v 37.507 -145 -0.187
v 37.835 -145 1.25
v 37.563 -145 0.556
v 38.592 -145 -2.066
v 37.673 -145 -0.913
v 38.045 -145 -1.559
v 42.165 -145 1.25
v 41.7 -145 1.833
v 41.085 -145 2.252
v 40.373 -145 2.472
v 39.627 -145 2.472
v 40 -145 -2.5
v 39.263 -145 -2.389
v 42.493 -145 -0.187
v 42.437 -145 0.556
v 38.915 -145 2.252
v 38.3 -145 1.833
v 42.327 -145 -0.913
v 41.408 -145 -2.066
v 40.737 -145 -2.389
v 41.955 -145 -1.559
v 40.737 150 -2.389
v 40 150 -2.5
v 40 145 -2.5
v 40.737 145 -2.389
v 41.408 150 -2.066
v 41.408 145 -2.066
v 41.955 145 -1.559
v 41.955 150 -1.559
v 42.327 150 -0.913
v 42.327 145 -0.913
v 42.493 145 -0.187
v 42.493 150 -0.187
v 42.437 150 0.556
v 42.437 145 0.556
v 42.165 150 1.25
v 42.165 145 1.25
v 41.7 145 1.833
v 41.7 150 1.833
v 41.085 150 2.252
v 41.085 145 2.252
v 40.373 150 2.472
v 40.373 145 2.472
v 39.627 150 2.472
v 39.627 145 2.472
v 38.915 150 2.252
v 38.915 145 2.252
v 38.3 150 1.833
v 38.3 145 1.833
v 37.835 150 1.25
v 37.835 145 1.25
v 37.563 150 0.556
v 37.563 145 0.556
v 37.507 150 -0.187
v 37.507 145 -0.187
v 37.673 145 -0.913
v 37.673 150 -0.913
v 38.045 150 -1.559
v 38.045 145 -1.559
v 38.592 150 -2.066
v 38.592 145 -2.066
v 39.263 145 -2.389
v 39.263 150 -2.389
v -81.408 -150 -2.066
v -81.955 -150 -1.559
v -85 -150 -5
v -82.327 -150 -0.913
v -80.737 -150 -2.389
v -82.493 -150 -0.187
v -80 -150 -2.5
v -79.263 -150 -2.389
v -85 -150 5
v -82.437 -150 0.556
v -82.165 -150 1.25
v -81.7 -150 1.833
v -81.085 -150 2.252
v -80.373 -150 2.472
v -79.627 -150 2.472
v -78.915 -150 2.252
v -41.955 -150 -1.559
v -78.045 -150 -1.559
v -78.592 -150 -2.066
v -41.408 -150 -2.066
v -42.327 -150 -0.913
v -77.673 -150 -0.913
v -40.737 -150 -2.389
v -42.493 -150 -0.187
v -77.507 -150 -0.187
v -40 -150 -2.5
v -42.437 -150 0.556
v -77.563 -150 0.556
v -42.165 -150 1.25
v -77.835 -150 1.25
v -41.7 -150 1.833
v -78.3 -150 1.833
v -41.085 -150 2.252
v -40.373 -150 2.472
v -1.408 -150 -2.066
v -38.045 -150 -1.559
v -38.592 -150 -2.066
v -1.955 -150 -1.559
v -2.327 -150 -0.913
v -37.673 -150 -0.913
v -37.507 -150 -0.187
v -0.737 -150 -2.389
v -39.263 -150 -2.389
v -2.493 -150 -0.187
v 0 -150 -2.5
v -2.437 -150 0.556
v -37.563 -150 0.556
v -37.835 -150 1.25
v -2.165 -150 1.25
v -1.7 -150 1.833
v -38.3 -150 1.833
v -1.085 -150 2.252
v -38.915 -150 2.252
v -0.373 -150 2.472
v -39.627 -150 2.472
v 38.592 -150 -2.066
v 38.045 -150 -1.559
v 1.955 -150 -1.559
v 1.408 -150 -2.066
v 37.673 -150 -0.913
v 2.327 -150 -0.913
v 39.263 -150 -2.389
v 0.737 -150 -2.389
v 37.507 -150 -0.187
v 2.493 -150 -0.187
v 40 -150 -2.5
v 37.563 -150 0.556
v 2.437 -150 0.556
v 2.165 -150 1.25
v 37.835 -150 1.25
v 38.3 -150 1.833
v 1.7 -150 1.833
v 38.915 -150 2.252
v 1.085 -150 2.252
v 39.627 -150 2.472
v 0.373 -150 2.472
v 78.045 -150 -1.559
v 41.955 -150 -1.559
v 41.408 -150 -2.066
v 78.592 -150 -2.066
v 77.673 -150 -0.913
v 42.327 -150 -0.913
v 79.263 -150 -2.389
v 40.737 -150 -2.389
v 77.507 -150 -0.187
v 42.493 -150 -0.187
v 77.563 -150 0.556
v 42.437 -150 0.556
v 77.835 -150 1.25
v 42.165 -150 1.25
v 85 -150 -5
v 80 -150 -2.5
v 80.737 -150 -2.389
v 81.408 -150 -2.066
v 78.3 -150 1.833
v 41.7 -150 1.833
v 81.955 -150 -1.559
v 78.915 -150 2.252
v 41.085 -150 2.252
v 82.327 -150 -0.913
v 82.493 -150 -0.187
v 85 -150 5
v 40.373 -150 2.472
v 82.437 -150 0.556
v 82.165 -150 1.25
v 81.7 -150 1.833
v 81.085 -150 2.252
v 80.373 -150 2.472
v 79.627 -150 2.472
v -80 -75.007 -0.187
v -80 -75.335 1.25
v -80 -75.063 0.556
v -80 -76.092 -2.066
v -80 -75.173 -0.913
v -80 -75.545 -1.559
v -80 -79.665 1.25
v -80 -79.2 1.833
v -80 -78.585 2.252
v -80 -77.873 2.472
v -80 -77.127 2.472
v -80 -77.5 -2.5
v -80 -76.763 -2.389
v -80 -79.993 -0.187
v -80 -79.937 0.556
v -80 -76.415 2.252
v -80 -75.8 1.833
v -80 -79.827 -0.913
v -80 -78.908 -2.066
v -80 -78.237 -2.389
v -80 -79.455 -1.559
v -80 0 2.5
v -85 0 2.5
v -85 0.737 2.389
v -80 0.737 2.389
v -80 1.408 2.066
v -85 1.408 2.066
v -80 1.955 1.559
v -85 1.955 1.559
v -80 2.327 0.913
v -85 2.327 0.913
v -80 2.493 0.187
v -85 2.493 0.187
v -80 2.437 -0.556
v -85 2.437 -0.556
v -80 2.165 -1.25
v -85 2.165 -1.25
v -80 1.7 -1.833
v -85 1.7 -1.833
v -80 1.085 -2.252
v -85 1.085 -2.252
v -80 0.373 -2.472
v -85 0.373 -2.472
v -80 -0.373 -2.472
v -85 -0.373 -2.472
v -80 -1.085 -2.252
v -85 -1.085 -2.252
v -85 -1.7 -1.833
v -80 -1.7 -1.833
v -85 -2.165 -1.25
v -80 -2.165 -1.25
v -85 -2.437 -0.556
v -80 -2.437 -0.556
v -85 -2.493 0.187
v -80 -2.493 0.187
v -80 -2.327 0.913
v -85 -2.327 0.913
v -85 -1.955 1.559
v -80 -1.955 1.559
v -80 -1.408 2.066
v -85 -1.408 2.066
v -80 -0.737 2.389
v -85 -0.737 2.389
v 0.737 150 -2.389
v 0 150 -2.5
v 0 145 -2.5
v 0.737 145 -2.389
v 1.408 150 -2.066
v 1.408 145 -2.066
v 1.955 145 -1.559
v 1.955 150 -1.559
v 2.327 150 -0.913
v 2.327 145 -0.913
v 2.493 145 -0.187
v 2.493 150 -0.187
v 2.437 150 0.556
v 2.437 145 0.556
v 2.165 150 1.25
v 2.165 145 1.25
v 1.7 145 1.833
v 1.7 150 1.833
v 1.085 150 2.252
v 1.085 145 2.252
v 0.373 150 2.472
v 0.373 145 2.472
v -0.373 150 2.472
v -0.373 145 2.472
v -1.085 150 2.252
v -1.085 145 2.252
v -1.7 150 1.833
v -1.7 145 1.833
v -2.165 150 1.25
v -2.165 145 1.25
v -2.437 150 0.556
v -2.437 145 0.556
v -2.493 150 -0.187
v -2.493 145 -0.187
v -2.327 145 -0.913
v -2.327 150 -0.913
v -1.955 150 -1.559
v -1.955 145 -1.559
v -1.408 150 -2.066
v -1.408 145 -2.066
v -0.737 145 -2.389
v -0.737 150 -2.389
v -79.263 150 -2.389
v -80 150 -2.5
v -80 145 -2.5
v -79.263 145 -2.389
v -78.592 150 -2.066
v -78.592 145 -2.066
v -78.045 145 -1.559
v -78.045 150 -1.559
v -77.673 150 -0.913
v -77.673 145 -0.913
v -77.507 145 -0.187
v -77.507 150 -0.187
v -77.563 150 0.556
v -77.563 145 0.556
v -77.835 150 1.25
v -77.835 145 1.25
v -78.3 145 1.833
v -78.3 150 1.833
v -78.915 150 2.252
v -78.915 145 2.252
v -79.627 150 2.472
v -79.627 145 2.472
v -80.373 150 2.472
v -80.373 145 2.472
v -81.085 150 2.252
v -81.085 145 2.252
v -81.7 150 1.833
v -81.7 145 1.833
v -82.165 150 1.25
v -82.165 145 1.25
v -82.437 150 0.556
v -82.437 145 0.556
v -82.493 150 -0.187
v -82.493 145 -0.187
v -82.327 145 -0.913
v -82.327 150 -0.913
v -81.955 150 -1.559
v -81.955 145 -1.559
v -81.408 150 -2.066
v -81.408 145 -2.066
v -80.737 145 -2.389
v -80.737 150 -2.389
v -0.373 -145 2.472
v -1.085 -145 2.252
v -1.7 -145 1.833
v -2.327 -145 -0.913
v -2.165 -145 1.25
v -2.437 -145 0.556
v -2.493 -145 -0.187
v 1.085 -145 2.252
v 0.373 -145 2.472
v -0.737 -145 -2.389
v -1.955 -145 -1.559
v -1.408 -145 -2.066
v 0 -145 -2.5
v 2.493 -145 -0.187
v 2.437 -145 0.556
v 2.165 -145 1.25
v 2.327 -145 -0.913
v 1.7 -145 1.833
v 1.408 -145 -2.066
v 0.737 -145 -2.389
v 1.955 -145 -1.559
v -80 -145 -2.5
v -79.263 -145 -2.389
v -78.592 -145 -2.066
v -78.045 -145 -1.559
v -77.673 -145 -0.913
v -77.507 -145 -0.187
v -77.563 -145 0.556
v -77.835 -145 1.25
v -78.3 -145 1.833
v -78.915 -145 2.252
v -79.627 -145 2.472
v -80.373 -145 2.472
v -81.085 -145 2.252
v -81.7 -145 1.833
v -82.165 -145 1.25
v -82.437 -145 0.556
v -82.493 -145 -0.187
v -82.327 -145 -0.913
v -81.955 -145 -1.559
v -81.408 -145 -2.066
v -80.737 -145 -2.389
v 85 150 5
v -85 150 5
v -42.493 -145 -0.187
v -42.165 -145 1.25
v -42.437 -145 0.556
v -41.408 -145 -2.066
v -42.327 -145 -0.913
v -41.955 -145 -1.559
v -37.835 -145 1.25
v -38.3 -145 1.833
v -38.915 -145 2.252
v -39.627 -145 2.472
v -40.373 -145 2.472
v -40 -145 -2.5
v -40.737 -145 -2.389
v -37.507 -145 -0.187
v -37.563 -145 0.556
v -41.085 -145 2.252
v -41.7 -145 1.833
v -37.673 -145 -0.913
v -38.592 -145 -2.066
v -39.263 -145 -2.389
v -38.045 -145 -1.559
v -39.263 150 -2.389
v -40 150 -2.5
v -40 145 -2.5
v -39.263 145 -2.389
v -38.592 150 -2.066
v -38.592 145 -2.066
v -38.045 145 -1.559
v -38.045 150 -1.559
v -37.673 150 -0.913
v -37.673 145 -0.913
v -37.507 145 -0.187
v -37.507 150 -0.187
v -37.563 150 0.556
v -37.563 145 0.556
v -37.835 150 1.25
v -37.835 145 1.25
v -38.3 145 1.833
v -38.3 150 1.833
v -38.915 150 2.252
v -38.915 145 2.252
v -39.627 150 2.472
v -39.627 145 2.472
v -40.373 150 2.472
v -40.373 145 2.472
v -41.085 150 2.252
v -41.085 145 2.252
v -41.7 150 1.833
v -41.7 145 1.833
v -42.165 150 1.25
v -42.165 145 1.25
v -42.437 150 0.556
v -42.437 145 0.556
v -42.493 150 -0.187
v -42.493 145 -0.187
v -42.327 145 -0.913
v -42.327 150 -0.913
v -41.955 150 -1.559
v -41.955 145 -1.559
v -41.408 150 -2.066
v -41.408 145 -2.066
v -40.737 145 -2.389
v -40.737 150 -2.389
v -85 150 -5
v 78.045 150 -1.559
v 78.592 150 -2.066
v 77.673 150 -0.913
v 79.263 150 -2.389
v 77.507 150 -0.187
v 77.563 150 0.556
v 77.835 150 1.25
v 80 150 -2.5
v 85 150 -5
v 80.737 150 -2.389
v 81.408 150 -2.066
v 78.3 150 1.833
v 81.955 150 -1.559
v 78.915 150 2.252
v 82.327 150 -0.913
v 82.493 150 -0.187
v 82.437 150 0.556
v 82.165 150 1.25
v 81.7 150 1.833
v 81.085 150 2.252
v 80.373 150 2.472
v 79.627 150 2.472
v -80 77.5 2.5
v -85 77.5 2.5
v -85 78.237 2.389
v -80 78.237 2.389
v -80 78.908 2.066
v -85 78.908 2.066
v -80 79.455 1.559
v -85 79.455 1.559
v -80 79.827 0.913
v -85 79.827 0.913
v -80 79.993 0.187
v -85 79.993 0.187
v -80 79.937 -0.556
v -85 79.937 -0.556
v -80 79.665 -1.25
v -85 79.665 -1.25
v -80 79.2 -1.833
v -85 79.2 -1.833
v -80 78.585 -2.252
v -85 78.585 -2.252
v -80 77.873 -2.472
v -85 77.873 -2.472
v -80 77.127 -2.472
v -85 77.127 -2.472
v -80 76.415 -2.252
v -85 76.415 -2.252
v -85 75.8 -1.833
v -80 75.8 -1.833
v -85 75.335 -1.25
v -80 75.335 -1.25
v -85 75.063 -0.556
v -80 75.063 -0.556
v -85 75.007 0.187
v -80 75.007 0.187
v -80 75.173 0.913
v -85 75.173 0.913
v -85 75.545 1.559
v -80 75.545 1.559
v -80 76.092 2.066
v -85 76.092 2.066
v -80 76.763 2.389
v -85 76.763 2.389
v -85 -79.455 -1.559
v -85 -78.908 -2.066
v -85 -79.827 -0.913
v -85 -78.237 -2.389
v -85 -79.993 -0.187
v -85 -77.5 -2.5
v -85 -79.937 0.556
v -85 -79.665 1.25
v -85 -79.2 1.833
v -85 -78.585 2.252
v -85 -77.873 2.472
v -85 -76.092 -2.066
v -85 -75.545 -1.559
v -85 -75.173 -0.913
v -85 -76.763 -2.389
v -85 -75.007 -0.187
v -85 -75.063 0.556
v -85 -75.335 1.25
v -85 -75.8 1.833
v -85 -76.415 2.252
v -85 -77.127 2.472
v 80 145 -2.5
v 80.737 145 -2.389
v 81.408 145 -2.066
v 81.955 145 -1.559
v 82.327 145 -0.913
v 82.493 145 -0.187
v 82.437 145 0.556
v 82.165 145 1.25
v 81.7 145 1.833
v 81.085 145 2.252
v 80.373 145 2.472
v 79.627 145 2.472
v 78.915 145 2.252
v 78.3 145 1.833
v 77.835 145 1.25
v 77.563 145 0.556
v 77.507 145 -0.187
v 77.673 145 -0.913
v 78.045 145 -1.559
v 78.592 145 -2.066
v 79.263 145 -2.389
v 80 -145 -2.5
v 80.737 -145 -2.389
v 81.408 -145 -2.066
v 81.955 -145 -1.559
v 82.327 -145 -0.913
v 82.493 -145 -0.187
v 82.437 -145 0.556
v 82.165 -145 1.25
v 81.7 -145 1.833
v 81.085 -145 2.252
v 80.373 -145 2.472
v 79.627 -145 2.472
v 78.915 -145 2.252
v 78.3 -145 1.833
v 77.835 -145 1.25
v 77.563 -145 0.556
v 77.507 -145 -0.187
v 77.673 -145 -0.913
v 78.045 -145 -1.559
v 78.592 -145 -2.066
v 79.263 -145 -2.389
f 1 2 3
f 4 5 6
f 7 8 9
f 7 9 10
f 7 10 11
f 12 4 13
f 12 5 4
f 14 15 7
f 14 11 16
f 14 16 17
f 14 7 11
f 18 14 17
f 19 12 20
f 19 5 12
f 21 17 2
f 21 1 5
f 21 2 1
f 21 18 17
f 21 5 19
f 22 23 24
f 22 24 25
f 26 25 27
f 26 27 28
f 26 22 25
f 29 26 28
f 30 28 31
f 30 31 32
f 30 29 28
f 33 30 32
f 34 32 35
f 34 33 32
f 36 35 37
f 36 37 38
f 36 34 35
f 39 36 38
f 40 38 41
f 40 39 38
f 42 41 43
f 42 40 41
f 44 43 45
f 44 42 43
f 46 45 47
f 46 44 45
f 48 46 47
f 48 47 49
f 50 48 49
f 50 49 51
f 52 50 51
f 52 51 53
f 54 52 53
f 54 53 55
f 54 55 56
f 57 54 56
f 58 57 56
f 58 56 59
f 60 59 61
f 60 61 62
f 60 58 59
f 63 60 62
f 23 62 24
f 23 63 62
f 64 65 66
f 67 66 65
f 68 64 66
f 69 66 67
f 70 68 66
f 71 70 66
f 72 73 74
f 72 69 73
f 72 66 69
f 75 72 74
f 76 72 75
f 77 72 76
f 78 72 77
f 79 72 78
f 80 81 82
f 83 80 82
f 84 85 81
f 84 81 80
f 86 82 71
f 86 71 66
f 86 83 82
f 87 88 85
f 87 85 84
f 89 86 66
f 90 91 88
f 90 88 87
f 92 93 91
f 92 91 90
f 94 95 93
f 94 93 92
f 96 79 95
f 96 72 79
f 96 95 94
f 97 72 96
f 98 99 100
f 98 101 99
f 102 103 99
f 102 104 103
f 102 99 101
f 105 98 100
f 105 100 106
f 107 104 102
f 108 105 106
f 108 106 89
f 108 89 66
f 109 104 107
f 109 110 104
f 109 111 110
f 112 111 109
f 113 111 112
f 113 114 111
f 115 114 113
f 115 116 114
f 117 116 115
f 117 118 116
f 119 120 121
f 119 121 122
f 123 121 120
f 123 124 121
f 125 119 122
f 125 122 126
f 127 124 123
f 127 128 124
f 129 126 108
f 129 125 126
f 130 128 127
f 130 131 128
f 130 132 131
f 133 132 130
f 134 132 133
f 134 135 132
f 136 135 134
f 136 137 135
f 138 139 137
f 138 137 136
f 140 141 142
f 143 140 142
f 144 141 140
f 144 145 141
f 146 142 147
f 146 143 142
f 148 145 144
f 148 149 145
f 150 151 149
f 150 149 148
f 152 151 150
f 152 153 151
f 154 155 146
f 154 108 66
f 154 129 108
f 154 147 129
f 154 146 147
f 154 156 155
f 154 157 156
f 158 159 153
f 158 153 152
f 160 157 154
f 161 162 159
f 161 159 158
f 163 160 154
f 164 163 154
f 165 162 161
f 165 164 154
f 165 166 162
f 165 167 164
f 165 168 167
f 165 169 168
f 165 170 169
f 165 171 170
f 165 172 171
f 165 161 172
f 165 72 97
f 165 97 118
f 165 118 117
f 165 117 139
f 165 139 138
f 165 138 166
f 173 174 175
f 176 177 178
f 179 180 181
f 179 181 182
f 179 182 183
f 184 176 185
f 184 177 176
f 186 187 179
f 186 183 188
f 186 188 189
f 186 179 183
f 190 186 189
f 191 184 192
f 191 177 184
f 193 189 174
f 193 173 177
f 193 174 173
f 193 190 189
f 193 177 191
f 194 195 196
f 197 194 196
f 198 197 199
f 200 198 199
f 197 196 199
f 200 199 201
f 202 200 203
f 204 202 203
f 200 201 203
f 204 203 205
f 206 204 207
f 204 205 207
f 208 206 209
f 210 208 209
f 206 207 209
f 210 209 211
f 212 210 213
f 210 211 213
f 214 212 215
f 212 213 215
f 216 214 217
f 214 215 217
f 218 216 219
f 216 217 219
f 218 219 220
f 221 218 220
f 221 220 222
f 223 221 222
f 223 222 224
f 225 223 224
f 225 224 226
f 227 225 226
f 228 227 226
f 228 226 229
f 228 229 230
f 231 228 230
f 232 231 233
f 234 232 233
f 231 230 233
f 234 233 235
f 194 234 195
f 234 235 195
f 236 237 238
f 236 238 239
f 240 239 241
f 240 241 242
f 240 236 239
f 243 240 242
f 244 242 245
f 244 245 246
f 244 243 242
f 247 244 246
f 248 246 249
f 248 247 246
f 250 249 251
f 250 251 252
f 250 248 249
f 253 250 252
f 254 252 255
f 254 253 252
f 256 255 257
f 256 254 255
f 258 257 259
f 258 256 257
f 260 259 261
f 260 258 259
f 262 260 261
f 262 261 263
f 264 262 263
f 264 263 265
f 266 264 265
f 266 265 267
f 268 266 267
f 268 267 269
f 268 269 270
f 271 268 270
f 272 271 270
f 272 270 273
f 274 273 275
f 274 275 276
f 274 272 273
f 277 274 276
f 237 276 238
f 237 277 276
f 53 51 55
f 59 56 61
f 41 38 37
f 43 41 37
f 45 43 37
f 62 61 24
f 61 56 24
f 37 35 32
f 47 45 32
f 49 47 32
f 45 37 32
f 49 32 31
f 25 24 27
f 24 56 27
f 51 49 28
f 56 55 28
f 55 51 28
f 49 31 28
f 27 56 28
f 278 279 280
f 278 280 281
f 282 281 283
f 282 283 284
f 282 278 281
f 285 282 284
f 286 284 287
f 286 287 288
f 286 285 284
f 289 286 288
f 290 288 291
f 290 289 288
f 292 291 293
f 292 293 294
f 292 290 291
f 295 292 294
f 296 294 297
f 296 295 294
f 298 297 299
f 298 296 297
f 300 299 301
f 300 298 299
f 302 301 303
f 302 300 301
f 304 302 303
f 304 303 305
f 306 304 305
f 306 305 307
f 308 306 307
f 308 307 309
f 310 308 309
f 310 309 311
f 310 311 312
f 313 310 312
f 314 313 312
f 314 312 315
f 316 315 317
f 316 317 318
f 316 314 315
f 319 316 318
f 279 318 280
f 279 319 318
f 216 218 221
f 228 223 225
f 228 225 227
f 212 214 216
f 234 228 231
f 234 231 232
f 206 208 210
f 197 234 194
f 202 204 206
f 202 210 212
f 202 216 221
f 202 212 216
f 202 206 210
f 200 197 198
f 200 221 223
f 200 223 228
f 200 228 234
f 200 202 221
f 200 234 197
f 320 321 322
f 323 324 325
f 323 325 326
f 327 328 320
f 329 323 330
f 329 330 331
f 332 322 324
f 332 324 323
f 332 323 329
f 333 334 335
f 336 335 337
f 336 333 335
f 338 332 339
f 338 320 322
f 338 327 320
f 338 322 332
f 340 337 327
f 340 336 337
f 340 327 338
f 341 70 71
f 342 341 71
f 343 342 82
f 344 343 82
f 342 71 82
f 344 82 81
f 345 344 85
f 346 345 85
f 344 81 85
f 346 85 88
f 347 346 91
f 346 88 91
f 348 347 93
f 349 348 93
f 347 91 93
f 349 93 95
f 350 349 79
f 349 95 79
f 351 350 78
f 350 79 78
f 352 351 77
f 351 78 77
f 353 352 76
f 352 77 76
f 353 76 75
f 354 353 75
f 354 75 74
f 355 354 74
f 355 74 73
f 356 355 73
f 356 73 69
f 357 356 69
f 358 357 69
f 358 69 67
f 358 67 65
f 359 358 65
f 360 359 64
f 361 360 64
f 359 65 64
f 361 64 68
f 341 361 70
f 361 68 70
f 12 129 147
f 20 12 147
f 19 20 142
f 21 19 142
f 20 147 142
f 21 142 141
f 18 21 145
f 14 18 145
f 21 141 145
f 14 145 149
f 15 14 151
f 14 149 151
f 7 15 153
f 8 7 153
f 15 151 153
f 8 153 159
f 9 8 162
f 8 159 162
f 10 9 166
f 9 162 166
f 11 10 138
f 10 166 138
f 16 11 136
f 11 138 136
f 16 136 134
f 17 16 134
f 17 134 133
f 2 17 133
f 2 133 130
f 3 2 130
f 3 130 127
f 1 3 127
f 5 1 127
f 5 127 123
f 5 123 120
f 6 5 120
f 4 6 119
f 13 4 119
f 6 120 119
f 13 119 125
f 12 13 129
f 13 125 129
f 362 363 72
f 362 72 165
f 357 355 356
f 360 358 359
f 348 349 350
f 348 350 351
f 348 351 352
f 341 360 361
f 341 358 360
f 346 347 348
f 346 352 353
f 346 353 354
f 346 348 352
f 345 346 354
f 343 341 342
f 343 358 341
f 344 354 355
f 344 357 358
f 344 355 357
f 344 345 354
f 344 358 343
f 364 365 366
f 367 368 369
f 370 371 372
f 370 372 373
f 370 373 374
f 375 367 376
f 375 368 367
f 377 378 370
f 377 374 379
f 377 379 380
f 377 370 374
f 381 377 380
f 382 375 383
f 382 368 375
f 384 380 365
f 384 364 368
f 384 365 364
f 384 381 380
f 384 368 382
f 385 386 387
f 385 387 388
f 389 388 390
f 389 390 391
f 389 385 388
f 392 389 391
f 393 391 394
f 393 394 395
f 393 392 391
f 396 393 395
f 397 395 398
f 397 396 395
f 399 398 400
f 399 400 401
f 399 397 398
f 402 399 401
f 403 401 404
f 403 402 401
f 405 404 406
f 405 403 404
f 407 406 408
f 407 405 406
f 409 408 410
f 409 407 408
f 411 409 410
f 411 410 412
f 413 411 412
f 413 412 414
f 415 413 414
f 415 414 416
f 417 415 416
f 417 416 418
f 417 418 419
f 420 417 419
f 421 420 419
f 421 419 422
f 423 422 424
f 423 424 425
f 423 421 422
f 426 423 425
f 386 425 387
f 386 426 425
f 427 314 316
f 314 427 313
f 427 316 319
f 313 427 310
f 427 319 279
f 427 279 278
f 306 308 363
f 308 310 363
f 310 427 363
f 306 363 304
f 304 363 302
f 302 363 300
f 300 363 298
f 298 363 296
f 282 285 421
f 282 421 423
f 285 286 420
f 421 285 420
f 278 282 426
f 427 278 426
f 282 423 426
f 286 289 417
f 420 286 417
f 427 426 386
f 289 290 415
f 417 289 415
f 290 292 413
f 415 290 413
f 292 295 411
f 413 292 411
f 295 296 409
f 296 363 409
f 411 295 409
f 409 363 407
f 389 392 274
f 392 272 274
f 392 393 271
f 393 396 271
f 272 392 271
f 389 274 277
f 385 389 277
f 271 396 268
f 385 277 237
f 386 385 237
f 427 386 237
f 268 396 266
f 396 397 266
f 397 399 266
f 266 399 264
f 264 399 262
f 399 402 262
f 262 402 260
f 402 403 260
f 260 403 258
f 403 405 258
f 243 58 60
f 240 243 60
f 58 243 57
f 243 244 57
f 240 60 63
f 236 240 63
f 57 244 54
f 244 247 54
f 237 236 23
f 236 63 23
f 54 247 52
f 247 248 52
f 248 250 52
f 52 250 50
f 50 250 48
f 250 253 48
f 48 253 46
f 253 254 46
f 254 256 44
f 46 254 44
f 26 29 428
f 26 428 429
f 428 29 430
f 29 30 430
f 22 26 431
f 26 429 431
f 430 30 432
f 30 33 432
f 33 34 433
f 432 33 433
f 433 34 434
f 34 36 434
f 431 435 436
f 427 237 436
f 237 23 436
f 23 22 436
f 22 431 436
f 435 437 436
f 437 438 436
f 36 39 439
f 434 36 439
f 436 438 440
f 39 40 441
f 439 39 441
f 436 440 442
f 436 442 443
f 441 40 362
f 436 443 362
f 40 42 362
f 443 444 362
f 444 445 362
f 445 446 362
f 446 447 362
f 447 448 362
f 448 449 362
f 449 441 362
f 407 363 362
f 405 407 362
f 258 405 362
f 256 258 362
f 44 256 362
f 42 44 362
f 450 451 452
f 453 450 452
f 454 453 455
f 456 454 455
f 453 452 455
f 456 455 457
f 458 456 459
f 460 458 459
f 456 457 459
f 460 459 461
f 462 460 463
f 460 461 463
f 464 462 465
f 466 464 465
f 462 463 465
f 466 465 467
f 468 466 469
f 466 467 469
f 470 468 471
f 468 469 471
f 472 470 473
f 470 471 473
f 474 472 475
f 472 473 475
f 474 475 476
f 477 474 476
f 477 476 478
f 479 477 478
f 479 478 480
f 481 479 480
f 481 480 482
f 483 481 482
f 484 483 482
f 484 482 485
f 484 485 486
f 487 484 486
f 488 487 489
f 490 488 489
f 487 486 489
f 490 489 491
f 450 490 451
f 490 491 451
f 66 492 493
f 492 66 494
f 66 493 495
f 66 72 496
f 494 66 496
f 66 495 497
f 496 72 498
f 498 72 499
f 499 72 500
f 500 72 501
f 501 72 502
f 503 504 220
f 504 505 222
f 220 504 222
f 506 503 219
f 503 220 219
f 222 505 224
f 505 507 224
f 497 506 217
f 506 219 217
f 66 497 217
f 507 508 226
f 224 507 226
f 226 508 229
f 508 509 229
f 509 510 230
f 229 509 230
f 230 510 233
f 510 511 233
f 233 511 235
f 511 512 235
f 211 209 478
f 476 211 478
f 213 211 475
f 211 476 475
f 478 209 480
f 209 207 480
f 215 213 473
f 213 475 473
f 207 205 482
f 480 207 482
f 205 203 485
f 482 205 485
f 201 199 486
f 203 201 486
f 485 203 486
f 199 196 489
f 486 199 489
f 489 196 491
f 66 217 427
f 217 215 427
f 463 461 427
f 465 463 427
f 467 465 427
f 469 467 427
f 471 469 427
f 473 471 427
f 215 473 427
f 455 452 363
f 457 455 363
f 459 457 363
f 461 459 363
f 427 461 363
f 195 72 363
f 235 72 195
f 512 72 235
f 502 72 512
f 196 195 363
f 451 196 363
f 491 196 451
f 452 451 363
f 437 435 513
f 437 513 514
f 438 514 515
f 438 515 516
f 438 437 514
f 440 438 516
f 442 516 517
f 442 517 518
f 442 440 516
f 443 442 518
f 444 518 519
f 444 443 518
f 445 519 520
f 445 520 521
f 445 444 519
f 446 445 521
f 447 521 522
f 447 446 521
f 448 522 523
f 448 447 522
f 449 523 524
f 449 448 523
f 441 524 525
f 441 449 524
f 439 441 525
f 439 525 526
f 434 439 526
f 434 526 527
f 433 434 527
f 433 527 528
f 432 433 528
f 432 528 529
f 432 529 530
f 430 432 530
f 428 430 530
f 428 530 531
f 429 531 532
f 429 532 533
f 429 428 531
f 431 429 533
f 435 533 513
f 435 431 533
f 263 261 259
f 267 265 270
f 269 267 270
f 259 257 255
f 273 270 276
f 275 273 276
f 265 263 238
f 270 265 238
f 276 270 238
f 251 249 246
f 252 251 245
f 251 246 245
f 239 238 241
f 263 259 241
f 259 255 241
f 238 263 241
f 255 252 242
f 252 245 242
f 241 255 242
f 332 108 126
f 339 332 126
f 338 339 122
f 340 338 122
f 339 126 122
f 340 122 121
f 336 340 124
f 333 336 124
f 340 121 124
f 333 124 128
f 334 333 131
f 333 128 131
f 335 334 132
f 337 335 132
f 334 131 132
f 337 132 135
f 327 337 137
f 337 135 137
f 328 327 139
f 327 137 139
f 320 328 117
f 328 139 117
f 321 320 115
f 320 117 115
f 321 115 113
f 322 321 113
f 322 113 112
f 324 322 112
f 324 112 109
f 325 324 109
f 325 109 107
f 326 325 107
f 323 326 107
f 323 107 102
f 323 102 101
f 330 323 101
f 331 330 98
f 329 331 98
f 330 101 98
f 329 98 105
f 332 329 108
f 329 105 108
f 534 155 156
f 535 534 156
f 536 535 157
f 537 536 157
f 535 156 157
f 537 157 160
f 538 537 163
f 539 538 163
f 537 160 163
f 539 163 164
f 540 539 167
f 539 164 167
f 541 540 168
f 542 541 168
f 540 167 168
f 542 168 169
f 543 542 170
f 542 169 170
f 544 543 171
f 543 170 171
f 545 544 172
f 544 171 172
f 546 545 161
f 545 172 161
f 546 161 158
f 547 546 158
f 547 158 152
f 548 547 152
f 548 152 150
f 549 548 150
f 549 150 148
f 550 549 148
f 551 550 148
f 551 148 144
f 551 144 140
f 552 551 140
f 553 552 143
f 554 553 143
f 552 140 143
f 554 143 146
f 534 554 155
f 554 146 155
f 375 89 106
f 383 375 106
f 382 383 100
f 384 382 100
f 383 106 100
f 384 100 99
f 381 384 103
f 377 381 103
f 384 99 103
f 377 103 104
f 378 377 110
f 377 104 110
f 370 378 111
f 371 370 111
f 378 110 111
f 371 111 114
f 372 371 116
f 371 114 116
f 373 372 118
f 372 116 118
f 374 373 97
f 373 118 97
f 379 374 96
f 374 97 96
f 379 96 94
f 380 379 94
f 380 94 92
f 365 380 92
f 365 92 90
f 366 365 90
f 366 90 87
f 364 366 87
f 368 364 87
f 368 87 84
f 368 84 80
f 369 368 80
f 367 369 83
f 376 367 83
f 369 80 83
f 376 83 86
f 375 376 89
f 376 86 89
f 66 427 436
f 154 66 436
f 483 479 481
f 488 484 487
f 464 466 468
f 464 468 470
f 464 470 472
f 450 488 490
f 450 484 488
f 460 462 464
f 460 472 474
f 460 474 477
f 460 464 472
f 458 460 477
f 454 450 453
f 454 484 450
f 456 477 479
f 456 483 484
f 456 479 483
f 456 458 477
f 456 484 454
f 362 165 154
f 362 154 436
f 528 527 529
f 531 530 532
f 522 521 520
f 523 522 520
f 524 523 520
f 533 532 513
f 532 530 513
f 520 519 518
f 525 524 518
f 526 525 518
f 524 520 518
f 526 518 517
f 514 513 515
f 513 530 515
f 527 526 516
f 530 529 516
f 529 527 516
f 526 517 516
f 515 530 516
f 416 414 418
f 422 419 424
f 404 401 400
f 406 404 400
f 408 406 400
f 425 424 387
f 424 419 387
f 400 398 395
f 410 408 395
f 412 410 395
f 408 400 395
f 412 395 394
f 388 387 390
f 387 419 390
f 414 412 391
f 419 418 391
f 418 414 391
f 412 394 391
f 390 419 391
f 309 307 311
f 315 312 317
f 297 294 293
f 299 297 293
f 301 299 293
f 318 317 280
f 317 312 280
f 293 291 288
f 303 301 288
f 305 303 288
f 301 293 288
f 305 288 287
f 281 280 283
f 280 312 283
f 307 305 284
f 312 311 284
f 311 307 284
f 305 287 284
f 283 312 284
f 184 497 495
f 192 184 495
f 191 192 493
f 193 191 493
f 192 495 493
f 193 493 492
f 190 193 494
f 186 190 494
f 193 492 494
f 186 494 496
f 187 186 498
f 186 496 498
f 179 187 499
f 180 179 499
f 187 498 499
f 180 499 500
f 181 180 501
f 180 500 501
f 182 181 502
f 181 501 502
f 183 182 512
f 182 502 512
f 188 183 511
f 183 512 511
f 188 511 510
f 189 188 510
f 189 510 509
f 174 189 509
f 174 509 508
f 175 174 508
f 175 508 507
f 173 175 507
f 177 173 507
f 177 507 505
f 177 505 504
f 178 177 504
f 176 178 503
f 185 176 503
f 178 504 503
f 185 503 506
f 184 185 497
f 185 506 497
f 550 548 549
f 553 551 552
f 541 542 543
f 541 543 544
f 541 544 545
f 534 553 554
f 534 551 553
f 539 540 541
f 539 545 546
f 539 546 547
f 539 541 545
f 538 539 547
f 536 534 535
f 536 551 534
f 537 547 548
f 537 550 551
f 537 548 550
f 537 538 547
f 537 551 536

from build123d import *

# Parameters (mm, degrees)
CROQUIS1_W              = 170
CROQUIS1_H              = 300
SALIENTE_EXTRUIR1_DEPTH = 5
CROQUIS3_R              = 2.5
CORTAR_EXTRUIR2_DEPTH   = 5
CROQUIS4_R              = 2.5
CORTAR_EXTRUIR3_DEPTH   = 5


with BuildPart() as part:
    # Croquis1 → Saliente-Extruir1 (new, symmetric)
    with BuildSketch(Plane.XY):
        Rectangle(CROQUIS1_W, CROQUIS1_H)
    extrude(amount=SALIENTE_EXTRUIR1_DEPTH, both=True)

    # Croquis3 → Cortar-Extruir2 (cut)
    with BuildSketch(Plane.XZ.offset(150)):
        with Locations(Location((80, 0, 0), (0, 0, 270))):
            Circle(CROQUIS3_R)
        with Locations(Location((40, 0, 0), (0, 0, 270))):
            Circle(CROQUIS3_R)
        with Locations(Location((0, 0, 0), (0, 0, 270))):
            Circle(CROQUIS3_R)
        with Locations(Location((-40, 0, 0), (0, 0, 270))):
            Circle(CROQUIS3_R)
        with Locations(Location((-80, 0, 0), (0, 0, 270))):
            Circle(CROQUIS3_R)
    cortar_extruir2 = extrude(amount=-CORTAR_EXTRUIR2_DEPTH, mode=Mode.SUBTRACT)

    # Simetría1: Cortar-Extruir2 across plane
    add(cortar_extruir2.mirror(Plane.ZX), mode=Mode.SUBTRACT)

    # Croquis4 → Cortar-Extruir3 (cut)
    with BuildSketch(Plane.ZY.offset(85)):
        Circle(CROQUIS4_R)
        with Locations((0, 77.5)):
            Circle(CROQUIS4_R)
        with Locations(Location((0, -77.5, 0), (0, 0, 180))):
            Circle(CROQUIS4_R)
    extrude(amount=-CORTAR_EXTRUIR3_DEPTH, mode=Mode.SUBTRACT)


solid = part.part
